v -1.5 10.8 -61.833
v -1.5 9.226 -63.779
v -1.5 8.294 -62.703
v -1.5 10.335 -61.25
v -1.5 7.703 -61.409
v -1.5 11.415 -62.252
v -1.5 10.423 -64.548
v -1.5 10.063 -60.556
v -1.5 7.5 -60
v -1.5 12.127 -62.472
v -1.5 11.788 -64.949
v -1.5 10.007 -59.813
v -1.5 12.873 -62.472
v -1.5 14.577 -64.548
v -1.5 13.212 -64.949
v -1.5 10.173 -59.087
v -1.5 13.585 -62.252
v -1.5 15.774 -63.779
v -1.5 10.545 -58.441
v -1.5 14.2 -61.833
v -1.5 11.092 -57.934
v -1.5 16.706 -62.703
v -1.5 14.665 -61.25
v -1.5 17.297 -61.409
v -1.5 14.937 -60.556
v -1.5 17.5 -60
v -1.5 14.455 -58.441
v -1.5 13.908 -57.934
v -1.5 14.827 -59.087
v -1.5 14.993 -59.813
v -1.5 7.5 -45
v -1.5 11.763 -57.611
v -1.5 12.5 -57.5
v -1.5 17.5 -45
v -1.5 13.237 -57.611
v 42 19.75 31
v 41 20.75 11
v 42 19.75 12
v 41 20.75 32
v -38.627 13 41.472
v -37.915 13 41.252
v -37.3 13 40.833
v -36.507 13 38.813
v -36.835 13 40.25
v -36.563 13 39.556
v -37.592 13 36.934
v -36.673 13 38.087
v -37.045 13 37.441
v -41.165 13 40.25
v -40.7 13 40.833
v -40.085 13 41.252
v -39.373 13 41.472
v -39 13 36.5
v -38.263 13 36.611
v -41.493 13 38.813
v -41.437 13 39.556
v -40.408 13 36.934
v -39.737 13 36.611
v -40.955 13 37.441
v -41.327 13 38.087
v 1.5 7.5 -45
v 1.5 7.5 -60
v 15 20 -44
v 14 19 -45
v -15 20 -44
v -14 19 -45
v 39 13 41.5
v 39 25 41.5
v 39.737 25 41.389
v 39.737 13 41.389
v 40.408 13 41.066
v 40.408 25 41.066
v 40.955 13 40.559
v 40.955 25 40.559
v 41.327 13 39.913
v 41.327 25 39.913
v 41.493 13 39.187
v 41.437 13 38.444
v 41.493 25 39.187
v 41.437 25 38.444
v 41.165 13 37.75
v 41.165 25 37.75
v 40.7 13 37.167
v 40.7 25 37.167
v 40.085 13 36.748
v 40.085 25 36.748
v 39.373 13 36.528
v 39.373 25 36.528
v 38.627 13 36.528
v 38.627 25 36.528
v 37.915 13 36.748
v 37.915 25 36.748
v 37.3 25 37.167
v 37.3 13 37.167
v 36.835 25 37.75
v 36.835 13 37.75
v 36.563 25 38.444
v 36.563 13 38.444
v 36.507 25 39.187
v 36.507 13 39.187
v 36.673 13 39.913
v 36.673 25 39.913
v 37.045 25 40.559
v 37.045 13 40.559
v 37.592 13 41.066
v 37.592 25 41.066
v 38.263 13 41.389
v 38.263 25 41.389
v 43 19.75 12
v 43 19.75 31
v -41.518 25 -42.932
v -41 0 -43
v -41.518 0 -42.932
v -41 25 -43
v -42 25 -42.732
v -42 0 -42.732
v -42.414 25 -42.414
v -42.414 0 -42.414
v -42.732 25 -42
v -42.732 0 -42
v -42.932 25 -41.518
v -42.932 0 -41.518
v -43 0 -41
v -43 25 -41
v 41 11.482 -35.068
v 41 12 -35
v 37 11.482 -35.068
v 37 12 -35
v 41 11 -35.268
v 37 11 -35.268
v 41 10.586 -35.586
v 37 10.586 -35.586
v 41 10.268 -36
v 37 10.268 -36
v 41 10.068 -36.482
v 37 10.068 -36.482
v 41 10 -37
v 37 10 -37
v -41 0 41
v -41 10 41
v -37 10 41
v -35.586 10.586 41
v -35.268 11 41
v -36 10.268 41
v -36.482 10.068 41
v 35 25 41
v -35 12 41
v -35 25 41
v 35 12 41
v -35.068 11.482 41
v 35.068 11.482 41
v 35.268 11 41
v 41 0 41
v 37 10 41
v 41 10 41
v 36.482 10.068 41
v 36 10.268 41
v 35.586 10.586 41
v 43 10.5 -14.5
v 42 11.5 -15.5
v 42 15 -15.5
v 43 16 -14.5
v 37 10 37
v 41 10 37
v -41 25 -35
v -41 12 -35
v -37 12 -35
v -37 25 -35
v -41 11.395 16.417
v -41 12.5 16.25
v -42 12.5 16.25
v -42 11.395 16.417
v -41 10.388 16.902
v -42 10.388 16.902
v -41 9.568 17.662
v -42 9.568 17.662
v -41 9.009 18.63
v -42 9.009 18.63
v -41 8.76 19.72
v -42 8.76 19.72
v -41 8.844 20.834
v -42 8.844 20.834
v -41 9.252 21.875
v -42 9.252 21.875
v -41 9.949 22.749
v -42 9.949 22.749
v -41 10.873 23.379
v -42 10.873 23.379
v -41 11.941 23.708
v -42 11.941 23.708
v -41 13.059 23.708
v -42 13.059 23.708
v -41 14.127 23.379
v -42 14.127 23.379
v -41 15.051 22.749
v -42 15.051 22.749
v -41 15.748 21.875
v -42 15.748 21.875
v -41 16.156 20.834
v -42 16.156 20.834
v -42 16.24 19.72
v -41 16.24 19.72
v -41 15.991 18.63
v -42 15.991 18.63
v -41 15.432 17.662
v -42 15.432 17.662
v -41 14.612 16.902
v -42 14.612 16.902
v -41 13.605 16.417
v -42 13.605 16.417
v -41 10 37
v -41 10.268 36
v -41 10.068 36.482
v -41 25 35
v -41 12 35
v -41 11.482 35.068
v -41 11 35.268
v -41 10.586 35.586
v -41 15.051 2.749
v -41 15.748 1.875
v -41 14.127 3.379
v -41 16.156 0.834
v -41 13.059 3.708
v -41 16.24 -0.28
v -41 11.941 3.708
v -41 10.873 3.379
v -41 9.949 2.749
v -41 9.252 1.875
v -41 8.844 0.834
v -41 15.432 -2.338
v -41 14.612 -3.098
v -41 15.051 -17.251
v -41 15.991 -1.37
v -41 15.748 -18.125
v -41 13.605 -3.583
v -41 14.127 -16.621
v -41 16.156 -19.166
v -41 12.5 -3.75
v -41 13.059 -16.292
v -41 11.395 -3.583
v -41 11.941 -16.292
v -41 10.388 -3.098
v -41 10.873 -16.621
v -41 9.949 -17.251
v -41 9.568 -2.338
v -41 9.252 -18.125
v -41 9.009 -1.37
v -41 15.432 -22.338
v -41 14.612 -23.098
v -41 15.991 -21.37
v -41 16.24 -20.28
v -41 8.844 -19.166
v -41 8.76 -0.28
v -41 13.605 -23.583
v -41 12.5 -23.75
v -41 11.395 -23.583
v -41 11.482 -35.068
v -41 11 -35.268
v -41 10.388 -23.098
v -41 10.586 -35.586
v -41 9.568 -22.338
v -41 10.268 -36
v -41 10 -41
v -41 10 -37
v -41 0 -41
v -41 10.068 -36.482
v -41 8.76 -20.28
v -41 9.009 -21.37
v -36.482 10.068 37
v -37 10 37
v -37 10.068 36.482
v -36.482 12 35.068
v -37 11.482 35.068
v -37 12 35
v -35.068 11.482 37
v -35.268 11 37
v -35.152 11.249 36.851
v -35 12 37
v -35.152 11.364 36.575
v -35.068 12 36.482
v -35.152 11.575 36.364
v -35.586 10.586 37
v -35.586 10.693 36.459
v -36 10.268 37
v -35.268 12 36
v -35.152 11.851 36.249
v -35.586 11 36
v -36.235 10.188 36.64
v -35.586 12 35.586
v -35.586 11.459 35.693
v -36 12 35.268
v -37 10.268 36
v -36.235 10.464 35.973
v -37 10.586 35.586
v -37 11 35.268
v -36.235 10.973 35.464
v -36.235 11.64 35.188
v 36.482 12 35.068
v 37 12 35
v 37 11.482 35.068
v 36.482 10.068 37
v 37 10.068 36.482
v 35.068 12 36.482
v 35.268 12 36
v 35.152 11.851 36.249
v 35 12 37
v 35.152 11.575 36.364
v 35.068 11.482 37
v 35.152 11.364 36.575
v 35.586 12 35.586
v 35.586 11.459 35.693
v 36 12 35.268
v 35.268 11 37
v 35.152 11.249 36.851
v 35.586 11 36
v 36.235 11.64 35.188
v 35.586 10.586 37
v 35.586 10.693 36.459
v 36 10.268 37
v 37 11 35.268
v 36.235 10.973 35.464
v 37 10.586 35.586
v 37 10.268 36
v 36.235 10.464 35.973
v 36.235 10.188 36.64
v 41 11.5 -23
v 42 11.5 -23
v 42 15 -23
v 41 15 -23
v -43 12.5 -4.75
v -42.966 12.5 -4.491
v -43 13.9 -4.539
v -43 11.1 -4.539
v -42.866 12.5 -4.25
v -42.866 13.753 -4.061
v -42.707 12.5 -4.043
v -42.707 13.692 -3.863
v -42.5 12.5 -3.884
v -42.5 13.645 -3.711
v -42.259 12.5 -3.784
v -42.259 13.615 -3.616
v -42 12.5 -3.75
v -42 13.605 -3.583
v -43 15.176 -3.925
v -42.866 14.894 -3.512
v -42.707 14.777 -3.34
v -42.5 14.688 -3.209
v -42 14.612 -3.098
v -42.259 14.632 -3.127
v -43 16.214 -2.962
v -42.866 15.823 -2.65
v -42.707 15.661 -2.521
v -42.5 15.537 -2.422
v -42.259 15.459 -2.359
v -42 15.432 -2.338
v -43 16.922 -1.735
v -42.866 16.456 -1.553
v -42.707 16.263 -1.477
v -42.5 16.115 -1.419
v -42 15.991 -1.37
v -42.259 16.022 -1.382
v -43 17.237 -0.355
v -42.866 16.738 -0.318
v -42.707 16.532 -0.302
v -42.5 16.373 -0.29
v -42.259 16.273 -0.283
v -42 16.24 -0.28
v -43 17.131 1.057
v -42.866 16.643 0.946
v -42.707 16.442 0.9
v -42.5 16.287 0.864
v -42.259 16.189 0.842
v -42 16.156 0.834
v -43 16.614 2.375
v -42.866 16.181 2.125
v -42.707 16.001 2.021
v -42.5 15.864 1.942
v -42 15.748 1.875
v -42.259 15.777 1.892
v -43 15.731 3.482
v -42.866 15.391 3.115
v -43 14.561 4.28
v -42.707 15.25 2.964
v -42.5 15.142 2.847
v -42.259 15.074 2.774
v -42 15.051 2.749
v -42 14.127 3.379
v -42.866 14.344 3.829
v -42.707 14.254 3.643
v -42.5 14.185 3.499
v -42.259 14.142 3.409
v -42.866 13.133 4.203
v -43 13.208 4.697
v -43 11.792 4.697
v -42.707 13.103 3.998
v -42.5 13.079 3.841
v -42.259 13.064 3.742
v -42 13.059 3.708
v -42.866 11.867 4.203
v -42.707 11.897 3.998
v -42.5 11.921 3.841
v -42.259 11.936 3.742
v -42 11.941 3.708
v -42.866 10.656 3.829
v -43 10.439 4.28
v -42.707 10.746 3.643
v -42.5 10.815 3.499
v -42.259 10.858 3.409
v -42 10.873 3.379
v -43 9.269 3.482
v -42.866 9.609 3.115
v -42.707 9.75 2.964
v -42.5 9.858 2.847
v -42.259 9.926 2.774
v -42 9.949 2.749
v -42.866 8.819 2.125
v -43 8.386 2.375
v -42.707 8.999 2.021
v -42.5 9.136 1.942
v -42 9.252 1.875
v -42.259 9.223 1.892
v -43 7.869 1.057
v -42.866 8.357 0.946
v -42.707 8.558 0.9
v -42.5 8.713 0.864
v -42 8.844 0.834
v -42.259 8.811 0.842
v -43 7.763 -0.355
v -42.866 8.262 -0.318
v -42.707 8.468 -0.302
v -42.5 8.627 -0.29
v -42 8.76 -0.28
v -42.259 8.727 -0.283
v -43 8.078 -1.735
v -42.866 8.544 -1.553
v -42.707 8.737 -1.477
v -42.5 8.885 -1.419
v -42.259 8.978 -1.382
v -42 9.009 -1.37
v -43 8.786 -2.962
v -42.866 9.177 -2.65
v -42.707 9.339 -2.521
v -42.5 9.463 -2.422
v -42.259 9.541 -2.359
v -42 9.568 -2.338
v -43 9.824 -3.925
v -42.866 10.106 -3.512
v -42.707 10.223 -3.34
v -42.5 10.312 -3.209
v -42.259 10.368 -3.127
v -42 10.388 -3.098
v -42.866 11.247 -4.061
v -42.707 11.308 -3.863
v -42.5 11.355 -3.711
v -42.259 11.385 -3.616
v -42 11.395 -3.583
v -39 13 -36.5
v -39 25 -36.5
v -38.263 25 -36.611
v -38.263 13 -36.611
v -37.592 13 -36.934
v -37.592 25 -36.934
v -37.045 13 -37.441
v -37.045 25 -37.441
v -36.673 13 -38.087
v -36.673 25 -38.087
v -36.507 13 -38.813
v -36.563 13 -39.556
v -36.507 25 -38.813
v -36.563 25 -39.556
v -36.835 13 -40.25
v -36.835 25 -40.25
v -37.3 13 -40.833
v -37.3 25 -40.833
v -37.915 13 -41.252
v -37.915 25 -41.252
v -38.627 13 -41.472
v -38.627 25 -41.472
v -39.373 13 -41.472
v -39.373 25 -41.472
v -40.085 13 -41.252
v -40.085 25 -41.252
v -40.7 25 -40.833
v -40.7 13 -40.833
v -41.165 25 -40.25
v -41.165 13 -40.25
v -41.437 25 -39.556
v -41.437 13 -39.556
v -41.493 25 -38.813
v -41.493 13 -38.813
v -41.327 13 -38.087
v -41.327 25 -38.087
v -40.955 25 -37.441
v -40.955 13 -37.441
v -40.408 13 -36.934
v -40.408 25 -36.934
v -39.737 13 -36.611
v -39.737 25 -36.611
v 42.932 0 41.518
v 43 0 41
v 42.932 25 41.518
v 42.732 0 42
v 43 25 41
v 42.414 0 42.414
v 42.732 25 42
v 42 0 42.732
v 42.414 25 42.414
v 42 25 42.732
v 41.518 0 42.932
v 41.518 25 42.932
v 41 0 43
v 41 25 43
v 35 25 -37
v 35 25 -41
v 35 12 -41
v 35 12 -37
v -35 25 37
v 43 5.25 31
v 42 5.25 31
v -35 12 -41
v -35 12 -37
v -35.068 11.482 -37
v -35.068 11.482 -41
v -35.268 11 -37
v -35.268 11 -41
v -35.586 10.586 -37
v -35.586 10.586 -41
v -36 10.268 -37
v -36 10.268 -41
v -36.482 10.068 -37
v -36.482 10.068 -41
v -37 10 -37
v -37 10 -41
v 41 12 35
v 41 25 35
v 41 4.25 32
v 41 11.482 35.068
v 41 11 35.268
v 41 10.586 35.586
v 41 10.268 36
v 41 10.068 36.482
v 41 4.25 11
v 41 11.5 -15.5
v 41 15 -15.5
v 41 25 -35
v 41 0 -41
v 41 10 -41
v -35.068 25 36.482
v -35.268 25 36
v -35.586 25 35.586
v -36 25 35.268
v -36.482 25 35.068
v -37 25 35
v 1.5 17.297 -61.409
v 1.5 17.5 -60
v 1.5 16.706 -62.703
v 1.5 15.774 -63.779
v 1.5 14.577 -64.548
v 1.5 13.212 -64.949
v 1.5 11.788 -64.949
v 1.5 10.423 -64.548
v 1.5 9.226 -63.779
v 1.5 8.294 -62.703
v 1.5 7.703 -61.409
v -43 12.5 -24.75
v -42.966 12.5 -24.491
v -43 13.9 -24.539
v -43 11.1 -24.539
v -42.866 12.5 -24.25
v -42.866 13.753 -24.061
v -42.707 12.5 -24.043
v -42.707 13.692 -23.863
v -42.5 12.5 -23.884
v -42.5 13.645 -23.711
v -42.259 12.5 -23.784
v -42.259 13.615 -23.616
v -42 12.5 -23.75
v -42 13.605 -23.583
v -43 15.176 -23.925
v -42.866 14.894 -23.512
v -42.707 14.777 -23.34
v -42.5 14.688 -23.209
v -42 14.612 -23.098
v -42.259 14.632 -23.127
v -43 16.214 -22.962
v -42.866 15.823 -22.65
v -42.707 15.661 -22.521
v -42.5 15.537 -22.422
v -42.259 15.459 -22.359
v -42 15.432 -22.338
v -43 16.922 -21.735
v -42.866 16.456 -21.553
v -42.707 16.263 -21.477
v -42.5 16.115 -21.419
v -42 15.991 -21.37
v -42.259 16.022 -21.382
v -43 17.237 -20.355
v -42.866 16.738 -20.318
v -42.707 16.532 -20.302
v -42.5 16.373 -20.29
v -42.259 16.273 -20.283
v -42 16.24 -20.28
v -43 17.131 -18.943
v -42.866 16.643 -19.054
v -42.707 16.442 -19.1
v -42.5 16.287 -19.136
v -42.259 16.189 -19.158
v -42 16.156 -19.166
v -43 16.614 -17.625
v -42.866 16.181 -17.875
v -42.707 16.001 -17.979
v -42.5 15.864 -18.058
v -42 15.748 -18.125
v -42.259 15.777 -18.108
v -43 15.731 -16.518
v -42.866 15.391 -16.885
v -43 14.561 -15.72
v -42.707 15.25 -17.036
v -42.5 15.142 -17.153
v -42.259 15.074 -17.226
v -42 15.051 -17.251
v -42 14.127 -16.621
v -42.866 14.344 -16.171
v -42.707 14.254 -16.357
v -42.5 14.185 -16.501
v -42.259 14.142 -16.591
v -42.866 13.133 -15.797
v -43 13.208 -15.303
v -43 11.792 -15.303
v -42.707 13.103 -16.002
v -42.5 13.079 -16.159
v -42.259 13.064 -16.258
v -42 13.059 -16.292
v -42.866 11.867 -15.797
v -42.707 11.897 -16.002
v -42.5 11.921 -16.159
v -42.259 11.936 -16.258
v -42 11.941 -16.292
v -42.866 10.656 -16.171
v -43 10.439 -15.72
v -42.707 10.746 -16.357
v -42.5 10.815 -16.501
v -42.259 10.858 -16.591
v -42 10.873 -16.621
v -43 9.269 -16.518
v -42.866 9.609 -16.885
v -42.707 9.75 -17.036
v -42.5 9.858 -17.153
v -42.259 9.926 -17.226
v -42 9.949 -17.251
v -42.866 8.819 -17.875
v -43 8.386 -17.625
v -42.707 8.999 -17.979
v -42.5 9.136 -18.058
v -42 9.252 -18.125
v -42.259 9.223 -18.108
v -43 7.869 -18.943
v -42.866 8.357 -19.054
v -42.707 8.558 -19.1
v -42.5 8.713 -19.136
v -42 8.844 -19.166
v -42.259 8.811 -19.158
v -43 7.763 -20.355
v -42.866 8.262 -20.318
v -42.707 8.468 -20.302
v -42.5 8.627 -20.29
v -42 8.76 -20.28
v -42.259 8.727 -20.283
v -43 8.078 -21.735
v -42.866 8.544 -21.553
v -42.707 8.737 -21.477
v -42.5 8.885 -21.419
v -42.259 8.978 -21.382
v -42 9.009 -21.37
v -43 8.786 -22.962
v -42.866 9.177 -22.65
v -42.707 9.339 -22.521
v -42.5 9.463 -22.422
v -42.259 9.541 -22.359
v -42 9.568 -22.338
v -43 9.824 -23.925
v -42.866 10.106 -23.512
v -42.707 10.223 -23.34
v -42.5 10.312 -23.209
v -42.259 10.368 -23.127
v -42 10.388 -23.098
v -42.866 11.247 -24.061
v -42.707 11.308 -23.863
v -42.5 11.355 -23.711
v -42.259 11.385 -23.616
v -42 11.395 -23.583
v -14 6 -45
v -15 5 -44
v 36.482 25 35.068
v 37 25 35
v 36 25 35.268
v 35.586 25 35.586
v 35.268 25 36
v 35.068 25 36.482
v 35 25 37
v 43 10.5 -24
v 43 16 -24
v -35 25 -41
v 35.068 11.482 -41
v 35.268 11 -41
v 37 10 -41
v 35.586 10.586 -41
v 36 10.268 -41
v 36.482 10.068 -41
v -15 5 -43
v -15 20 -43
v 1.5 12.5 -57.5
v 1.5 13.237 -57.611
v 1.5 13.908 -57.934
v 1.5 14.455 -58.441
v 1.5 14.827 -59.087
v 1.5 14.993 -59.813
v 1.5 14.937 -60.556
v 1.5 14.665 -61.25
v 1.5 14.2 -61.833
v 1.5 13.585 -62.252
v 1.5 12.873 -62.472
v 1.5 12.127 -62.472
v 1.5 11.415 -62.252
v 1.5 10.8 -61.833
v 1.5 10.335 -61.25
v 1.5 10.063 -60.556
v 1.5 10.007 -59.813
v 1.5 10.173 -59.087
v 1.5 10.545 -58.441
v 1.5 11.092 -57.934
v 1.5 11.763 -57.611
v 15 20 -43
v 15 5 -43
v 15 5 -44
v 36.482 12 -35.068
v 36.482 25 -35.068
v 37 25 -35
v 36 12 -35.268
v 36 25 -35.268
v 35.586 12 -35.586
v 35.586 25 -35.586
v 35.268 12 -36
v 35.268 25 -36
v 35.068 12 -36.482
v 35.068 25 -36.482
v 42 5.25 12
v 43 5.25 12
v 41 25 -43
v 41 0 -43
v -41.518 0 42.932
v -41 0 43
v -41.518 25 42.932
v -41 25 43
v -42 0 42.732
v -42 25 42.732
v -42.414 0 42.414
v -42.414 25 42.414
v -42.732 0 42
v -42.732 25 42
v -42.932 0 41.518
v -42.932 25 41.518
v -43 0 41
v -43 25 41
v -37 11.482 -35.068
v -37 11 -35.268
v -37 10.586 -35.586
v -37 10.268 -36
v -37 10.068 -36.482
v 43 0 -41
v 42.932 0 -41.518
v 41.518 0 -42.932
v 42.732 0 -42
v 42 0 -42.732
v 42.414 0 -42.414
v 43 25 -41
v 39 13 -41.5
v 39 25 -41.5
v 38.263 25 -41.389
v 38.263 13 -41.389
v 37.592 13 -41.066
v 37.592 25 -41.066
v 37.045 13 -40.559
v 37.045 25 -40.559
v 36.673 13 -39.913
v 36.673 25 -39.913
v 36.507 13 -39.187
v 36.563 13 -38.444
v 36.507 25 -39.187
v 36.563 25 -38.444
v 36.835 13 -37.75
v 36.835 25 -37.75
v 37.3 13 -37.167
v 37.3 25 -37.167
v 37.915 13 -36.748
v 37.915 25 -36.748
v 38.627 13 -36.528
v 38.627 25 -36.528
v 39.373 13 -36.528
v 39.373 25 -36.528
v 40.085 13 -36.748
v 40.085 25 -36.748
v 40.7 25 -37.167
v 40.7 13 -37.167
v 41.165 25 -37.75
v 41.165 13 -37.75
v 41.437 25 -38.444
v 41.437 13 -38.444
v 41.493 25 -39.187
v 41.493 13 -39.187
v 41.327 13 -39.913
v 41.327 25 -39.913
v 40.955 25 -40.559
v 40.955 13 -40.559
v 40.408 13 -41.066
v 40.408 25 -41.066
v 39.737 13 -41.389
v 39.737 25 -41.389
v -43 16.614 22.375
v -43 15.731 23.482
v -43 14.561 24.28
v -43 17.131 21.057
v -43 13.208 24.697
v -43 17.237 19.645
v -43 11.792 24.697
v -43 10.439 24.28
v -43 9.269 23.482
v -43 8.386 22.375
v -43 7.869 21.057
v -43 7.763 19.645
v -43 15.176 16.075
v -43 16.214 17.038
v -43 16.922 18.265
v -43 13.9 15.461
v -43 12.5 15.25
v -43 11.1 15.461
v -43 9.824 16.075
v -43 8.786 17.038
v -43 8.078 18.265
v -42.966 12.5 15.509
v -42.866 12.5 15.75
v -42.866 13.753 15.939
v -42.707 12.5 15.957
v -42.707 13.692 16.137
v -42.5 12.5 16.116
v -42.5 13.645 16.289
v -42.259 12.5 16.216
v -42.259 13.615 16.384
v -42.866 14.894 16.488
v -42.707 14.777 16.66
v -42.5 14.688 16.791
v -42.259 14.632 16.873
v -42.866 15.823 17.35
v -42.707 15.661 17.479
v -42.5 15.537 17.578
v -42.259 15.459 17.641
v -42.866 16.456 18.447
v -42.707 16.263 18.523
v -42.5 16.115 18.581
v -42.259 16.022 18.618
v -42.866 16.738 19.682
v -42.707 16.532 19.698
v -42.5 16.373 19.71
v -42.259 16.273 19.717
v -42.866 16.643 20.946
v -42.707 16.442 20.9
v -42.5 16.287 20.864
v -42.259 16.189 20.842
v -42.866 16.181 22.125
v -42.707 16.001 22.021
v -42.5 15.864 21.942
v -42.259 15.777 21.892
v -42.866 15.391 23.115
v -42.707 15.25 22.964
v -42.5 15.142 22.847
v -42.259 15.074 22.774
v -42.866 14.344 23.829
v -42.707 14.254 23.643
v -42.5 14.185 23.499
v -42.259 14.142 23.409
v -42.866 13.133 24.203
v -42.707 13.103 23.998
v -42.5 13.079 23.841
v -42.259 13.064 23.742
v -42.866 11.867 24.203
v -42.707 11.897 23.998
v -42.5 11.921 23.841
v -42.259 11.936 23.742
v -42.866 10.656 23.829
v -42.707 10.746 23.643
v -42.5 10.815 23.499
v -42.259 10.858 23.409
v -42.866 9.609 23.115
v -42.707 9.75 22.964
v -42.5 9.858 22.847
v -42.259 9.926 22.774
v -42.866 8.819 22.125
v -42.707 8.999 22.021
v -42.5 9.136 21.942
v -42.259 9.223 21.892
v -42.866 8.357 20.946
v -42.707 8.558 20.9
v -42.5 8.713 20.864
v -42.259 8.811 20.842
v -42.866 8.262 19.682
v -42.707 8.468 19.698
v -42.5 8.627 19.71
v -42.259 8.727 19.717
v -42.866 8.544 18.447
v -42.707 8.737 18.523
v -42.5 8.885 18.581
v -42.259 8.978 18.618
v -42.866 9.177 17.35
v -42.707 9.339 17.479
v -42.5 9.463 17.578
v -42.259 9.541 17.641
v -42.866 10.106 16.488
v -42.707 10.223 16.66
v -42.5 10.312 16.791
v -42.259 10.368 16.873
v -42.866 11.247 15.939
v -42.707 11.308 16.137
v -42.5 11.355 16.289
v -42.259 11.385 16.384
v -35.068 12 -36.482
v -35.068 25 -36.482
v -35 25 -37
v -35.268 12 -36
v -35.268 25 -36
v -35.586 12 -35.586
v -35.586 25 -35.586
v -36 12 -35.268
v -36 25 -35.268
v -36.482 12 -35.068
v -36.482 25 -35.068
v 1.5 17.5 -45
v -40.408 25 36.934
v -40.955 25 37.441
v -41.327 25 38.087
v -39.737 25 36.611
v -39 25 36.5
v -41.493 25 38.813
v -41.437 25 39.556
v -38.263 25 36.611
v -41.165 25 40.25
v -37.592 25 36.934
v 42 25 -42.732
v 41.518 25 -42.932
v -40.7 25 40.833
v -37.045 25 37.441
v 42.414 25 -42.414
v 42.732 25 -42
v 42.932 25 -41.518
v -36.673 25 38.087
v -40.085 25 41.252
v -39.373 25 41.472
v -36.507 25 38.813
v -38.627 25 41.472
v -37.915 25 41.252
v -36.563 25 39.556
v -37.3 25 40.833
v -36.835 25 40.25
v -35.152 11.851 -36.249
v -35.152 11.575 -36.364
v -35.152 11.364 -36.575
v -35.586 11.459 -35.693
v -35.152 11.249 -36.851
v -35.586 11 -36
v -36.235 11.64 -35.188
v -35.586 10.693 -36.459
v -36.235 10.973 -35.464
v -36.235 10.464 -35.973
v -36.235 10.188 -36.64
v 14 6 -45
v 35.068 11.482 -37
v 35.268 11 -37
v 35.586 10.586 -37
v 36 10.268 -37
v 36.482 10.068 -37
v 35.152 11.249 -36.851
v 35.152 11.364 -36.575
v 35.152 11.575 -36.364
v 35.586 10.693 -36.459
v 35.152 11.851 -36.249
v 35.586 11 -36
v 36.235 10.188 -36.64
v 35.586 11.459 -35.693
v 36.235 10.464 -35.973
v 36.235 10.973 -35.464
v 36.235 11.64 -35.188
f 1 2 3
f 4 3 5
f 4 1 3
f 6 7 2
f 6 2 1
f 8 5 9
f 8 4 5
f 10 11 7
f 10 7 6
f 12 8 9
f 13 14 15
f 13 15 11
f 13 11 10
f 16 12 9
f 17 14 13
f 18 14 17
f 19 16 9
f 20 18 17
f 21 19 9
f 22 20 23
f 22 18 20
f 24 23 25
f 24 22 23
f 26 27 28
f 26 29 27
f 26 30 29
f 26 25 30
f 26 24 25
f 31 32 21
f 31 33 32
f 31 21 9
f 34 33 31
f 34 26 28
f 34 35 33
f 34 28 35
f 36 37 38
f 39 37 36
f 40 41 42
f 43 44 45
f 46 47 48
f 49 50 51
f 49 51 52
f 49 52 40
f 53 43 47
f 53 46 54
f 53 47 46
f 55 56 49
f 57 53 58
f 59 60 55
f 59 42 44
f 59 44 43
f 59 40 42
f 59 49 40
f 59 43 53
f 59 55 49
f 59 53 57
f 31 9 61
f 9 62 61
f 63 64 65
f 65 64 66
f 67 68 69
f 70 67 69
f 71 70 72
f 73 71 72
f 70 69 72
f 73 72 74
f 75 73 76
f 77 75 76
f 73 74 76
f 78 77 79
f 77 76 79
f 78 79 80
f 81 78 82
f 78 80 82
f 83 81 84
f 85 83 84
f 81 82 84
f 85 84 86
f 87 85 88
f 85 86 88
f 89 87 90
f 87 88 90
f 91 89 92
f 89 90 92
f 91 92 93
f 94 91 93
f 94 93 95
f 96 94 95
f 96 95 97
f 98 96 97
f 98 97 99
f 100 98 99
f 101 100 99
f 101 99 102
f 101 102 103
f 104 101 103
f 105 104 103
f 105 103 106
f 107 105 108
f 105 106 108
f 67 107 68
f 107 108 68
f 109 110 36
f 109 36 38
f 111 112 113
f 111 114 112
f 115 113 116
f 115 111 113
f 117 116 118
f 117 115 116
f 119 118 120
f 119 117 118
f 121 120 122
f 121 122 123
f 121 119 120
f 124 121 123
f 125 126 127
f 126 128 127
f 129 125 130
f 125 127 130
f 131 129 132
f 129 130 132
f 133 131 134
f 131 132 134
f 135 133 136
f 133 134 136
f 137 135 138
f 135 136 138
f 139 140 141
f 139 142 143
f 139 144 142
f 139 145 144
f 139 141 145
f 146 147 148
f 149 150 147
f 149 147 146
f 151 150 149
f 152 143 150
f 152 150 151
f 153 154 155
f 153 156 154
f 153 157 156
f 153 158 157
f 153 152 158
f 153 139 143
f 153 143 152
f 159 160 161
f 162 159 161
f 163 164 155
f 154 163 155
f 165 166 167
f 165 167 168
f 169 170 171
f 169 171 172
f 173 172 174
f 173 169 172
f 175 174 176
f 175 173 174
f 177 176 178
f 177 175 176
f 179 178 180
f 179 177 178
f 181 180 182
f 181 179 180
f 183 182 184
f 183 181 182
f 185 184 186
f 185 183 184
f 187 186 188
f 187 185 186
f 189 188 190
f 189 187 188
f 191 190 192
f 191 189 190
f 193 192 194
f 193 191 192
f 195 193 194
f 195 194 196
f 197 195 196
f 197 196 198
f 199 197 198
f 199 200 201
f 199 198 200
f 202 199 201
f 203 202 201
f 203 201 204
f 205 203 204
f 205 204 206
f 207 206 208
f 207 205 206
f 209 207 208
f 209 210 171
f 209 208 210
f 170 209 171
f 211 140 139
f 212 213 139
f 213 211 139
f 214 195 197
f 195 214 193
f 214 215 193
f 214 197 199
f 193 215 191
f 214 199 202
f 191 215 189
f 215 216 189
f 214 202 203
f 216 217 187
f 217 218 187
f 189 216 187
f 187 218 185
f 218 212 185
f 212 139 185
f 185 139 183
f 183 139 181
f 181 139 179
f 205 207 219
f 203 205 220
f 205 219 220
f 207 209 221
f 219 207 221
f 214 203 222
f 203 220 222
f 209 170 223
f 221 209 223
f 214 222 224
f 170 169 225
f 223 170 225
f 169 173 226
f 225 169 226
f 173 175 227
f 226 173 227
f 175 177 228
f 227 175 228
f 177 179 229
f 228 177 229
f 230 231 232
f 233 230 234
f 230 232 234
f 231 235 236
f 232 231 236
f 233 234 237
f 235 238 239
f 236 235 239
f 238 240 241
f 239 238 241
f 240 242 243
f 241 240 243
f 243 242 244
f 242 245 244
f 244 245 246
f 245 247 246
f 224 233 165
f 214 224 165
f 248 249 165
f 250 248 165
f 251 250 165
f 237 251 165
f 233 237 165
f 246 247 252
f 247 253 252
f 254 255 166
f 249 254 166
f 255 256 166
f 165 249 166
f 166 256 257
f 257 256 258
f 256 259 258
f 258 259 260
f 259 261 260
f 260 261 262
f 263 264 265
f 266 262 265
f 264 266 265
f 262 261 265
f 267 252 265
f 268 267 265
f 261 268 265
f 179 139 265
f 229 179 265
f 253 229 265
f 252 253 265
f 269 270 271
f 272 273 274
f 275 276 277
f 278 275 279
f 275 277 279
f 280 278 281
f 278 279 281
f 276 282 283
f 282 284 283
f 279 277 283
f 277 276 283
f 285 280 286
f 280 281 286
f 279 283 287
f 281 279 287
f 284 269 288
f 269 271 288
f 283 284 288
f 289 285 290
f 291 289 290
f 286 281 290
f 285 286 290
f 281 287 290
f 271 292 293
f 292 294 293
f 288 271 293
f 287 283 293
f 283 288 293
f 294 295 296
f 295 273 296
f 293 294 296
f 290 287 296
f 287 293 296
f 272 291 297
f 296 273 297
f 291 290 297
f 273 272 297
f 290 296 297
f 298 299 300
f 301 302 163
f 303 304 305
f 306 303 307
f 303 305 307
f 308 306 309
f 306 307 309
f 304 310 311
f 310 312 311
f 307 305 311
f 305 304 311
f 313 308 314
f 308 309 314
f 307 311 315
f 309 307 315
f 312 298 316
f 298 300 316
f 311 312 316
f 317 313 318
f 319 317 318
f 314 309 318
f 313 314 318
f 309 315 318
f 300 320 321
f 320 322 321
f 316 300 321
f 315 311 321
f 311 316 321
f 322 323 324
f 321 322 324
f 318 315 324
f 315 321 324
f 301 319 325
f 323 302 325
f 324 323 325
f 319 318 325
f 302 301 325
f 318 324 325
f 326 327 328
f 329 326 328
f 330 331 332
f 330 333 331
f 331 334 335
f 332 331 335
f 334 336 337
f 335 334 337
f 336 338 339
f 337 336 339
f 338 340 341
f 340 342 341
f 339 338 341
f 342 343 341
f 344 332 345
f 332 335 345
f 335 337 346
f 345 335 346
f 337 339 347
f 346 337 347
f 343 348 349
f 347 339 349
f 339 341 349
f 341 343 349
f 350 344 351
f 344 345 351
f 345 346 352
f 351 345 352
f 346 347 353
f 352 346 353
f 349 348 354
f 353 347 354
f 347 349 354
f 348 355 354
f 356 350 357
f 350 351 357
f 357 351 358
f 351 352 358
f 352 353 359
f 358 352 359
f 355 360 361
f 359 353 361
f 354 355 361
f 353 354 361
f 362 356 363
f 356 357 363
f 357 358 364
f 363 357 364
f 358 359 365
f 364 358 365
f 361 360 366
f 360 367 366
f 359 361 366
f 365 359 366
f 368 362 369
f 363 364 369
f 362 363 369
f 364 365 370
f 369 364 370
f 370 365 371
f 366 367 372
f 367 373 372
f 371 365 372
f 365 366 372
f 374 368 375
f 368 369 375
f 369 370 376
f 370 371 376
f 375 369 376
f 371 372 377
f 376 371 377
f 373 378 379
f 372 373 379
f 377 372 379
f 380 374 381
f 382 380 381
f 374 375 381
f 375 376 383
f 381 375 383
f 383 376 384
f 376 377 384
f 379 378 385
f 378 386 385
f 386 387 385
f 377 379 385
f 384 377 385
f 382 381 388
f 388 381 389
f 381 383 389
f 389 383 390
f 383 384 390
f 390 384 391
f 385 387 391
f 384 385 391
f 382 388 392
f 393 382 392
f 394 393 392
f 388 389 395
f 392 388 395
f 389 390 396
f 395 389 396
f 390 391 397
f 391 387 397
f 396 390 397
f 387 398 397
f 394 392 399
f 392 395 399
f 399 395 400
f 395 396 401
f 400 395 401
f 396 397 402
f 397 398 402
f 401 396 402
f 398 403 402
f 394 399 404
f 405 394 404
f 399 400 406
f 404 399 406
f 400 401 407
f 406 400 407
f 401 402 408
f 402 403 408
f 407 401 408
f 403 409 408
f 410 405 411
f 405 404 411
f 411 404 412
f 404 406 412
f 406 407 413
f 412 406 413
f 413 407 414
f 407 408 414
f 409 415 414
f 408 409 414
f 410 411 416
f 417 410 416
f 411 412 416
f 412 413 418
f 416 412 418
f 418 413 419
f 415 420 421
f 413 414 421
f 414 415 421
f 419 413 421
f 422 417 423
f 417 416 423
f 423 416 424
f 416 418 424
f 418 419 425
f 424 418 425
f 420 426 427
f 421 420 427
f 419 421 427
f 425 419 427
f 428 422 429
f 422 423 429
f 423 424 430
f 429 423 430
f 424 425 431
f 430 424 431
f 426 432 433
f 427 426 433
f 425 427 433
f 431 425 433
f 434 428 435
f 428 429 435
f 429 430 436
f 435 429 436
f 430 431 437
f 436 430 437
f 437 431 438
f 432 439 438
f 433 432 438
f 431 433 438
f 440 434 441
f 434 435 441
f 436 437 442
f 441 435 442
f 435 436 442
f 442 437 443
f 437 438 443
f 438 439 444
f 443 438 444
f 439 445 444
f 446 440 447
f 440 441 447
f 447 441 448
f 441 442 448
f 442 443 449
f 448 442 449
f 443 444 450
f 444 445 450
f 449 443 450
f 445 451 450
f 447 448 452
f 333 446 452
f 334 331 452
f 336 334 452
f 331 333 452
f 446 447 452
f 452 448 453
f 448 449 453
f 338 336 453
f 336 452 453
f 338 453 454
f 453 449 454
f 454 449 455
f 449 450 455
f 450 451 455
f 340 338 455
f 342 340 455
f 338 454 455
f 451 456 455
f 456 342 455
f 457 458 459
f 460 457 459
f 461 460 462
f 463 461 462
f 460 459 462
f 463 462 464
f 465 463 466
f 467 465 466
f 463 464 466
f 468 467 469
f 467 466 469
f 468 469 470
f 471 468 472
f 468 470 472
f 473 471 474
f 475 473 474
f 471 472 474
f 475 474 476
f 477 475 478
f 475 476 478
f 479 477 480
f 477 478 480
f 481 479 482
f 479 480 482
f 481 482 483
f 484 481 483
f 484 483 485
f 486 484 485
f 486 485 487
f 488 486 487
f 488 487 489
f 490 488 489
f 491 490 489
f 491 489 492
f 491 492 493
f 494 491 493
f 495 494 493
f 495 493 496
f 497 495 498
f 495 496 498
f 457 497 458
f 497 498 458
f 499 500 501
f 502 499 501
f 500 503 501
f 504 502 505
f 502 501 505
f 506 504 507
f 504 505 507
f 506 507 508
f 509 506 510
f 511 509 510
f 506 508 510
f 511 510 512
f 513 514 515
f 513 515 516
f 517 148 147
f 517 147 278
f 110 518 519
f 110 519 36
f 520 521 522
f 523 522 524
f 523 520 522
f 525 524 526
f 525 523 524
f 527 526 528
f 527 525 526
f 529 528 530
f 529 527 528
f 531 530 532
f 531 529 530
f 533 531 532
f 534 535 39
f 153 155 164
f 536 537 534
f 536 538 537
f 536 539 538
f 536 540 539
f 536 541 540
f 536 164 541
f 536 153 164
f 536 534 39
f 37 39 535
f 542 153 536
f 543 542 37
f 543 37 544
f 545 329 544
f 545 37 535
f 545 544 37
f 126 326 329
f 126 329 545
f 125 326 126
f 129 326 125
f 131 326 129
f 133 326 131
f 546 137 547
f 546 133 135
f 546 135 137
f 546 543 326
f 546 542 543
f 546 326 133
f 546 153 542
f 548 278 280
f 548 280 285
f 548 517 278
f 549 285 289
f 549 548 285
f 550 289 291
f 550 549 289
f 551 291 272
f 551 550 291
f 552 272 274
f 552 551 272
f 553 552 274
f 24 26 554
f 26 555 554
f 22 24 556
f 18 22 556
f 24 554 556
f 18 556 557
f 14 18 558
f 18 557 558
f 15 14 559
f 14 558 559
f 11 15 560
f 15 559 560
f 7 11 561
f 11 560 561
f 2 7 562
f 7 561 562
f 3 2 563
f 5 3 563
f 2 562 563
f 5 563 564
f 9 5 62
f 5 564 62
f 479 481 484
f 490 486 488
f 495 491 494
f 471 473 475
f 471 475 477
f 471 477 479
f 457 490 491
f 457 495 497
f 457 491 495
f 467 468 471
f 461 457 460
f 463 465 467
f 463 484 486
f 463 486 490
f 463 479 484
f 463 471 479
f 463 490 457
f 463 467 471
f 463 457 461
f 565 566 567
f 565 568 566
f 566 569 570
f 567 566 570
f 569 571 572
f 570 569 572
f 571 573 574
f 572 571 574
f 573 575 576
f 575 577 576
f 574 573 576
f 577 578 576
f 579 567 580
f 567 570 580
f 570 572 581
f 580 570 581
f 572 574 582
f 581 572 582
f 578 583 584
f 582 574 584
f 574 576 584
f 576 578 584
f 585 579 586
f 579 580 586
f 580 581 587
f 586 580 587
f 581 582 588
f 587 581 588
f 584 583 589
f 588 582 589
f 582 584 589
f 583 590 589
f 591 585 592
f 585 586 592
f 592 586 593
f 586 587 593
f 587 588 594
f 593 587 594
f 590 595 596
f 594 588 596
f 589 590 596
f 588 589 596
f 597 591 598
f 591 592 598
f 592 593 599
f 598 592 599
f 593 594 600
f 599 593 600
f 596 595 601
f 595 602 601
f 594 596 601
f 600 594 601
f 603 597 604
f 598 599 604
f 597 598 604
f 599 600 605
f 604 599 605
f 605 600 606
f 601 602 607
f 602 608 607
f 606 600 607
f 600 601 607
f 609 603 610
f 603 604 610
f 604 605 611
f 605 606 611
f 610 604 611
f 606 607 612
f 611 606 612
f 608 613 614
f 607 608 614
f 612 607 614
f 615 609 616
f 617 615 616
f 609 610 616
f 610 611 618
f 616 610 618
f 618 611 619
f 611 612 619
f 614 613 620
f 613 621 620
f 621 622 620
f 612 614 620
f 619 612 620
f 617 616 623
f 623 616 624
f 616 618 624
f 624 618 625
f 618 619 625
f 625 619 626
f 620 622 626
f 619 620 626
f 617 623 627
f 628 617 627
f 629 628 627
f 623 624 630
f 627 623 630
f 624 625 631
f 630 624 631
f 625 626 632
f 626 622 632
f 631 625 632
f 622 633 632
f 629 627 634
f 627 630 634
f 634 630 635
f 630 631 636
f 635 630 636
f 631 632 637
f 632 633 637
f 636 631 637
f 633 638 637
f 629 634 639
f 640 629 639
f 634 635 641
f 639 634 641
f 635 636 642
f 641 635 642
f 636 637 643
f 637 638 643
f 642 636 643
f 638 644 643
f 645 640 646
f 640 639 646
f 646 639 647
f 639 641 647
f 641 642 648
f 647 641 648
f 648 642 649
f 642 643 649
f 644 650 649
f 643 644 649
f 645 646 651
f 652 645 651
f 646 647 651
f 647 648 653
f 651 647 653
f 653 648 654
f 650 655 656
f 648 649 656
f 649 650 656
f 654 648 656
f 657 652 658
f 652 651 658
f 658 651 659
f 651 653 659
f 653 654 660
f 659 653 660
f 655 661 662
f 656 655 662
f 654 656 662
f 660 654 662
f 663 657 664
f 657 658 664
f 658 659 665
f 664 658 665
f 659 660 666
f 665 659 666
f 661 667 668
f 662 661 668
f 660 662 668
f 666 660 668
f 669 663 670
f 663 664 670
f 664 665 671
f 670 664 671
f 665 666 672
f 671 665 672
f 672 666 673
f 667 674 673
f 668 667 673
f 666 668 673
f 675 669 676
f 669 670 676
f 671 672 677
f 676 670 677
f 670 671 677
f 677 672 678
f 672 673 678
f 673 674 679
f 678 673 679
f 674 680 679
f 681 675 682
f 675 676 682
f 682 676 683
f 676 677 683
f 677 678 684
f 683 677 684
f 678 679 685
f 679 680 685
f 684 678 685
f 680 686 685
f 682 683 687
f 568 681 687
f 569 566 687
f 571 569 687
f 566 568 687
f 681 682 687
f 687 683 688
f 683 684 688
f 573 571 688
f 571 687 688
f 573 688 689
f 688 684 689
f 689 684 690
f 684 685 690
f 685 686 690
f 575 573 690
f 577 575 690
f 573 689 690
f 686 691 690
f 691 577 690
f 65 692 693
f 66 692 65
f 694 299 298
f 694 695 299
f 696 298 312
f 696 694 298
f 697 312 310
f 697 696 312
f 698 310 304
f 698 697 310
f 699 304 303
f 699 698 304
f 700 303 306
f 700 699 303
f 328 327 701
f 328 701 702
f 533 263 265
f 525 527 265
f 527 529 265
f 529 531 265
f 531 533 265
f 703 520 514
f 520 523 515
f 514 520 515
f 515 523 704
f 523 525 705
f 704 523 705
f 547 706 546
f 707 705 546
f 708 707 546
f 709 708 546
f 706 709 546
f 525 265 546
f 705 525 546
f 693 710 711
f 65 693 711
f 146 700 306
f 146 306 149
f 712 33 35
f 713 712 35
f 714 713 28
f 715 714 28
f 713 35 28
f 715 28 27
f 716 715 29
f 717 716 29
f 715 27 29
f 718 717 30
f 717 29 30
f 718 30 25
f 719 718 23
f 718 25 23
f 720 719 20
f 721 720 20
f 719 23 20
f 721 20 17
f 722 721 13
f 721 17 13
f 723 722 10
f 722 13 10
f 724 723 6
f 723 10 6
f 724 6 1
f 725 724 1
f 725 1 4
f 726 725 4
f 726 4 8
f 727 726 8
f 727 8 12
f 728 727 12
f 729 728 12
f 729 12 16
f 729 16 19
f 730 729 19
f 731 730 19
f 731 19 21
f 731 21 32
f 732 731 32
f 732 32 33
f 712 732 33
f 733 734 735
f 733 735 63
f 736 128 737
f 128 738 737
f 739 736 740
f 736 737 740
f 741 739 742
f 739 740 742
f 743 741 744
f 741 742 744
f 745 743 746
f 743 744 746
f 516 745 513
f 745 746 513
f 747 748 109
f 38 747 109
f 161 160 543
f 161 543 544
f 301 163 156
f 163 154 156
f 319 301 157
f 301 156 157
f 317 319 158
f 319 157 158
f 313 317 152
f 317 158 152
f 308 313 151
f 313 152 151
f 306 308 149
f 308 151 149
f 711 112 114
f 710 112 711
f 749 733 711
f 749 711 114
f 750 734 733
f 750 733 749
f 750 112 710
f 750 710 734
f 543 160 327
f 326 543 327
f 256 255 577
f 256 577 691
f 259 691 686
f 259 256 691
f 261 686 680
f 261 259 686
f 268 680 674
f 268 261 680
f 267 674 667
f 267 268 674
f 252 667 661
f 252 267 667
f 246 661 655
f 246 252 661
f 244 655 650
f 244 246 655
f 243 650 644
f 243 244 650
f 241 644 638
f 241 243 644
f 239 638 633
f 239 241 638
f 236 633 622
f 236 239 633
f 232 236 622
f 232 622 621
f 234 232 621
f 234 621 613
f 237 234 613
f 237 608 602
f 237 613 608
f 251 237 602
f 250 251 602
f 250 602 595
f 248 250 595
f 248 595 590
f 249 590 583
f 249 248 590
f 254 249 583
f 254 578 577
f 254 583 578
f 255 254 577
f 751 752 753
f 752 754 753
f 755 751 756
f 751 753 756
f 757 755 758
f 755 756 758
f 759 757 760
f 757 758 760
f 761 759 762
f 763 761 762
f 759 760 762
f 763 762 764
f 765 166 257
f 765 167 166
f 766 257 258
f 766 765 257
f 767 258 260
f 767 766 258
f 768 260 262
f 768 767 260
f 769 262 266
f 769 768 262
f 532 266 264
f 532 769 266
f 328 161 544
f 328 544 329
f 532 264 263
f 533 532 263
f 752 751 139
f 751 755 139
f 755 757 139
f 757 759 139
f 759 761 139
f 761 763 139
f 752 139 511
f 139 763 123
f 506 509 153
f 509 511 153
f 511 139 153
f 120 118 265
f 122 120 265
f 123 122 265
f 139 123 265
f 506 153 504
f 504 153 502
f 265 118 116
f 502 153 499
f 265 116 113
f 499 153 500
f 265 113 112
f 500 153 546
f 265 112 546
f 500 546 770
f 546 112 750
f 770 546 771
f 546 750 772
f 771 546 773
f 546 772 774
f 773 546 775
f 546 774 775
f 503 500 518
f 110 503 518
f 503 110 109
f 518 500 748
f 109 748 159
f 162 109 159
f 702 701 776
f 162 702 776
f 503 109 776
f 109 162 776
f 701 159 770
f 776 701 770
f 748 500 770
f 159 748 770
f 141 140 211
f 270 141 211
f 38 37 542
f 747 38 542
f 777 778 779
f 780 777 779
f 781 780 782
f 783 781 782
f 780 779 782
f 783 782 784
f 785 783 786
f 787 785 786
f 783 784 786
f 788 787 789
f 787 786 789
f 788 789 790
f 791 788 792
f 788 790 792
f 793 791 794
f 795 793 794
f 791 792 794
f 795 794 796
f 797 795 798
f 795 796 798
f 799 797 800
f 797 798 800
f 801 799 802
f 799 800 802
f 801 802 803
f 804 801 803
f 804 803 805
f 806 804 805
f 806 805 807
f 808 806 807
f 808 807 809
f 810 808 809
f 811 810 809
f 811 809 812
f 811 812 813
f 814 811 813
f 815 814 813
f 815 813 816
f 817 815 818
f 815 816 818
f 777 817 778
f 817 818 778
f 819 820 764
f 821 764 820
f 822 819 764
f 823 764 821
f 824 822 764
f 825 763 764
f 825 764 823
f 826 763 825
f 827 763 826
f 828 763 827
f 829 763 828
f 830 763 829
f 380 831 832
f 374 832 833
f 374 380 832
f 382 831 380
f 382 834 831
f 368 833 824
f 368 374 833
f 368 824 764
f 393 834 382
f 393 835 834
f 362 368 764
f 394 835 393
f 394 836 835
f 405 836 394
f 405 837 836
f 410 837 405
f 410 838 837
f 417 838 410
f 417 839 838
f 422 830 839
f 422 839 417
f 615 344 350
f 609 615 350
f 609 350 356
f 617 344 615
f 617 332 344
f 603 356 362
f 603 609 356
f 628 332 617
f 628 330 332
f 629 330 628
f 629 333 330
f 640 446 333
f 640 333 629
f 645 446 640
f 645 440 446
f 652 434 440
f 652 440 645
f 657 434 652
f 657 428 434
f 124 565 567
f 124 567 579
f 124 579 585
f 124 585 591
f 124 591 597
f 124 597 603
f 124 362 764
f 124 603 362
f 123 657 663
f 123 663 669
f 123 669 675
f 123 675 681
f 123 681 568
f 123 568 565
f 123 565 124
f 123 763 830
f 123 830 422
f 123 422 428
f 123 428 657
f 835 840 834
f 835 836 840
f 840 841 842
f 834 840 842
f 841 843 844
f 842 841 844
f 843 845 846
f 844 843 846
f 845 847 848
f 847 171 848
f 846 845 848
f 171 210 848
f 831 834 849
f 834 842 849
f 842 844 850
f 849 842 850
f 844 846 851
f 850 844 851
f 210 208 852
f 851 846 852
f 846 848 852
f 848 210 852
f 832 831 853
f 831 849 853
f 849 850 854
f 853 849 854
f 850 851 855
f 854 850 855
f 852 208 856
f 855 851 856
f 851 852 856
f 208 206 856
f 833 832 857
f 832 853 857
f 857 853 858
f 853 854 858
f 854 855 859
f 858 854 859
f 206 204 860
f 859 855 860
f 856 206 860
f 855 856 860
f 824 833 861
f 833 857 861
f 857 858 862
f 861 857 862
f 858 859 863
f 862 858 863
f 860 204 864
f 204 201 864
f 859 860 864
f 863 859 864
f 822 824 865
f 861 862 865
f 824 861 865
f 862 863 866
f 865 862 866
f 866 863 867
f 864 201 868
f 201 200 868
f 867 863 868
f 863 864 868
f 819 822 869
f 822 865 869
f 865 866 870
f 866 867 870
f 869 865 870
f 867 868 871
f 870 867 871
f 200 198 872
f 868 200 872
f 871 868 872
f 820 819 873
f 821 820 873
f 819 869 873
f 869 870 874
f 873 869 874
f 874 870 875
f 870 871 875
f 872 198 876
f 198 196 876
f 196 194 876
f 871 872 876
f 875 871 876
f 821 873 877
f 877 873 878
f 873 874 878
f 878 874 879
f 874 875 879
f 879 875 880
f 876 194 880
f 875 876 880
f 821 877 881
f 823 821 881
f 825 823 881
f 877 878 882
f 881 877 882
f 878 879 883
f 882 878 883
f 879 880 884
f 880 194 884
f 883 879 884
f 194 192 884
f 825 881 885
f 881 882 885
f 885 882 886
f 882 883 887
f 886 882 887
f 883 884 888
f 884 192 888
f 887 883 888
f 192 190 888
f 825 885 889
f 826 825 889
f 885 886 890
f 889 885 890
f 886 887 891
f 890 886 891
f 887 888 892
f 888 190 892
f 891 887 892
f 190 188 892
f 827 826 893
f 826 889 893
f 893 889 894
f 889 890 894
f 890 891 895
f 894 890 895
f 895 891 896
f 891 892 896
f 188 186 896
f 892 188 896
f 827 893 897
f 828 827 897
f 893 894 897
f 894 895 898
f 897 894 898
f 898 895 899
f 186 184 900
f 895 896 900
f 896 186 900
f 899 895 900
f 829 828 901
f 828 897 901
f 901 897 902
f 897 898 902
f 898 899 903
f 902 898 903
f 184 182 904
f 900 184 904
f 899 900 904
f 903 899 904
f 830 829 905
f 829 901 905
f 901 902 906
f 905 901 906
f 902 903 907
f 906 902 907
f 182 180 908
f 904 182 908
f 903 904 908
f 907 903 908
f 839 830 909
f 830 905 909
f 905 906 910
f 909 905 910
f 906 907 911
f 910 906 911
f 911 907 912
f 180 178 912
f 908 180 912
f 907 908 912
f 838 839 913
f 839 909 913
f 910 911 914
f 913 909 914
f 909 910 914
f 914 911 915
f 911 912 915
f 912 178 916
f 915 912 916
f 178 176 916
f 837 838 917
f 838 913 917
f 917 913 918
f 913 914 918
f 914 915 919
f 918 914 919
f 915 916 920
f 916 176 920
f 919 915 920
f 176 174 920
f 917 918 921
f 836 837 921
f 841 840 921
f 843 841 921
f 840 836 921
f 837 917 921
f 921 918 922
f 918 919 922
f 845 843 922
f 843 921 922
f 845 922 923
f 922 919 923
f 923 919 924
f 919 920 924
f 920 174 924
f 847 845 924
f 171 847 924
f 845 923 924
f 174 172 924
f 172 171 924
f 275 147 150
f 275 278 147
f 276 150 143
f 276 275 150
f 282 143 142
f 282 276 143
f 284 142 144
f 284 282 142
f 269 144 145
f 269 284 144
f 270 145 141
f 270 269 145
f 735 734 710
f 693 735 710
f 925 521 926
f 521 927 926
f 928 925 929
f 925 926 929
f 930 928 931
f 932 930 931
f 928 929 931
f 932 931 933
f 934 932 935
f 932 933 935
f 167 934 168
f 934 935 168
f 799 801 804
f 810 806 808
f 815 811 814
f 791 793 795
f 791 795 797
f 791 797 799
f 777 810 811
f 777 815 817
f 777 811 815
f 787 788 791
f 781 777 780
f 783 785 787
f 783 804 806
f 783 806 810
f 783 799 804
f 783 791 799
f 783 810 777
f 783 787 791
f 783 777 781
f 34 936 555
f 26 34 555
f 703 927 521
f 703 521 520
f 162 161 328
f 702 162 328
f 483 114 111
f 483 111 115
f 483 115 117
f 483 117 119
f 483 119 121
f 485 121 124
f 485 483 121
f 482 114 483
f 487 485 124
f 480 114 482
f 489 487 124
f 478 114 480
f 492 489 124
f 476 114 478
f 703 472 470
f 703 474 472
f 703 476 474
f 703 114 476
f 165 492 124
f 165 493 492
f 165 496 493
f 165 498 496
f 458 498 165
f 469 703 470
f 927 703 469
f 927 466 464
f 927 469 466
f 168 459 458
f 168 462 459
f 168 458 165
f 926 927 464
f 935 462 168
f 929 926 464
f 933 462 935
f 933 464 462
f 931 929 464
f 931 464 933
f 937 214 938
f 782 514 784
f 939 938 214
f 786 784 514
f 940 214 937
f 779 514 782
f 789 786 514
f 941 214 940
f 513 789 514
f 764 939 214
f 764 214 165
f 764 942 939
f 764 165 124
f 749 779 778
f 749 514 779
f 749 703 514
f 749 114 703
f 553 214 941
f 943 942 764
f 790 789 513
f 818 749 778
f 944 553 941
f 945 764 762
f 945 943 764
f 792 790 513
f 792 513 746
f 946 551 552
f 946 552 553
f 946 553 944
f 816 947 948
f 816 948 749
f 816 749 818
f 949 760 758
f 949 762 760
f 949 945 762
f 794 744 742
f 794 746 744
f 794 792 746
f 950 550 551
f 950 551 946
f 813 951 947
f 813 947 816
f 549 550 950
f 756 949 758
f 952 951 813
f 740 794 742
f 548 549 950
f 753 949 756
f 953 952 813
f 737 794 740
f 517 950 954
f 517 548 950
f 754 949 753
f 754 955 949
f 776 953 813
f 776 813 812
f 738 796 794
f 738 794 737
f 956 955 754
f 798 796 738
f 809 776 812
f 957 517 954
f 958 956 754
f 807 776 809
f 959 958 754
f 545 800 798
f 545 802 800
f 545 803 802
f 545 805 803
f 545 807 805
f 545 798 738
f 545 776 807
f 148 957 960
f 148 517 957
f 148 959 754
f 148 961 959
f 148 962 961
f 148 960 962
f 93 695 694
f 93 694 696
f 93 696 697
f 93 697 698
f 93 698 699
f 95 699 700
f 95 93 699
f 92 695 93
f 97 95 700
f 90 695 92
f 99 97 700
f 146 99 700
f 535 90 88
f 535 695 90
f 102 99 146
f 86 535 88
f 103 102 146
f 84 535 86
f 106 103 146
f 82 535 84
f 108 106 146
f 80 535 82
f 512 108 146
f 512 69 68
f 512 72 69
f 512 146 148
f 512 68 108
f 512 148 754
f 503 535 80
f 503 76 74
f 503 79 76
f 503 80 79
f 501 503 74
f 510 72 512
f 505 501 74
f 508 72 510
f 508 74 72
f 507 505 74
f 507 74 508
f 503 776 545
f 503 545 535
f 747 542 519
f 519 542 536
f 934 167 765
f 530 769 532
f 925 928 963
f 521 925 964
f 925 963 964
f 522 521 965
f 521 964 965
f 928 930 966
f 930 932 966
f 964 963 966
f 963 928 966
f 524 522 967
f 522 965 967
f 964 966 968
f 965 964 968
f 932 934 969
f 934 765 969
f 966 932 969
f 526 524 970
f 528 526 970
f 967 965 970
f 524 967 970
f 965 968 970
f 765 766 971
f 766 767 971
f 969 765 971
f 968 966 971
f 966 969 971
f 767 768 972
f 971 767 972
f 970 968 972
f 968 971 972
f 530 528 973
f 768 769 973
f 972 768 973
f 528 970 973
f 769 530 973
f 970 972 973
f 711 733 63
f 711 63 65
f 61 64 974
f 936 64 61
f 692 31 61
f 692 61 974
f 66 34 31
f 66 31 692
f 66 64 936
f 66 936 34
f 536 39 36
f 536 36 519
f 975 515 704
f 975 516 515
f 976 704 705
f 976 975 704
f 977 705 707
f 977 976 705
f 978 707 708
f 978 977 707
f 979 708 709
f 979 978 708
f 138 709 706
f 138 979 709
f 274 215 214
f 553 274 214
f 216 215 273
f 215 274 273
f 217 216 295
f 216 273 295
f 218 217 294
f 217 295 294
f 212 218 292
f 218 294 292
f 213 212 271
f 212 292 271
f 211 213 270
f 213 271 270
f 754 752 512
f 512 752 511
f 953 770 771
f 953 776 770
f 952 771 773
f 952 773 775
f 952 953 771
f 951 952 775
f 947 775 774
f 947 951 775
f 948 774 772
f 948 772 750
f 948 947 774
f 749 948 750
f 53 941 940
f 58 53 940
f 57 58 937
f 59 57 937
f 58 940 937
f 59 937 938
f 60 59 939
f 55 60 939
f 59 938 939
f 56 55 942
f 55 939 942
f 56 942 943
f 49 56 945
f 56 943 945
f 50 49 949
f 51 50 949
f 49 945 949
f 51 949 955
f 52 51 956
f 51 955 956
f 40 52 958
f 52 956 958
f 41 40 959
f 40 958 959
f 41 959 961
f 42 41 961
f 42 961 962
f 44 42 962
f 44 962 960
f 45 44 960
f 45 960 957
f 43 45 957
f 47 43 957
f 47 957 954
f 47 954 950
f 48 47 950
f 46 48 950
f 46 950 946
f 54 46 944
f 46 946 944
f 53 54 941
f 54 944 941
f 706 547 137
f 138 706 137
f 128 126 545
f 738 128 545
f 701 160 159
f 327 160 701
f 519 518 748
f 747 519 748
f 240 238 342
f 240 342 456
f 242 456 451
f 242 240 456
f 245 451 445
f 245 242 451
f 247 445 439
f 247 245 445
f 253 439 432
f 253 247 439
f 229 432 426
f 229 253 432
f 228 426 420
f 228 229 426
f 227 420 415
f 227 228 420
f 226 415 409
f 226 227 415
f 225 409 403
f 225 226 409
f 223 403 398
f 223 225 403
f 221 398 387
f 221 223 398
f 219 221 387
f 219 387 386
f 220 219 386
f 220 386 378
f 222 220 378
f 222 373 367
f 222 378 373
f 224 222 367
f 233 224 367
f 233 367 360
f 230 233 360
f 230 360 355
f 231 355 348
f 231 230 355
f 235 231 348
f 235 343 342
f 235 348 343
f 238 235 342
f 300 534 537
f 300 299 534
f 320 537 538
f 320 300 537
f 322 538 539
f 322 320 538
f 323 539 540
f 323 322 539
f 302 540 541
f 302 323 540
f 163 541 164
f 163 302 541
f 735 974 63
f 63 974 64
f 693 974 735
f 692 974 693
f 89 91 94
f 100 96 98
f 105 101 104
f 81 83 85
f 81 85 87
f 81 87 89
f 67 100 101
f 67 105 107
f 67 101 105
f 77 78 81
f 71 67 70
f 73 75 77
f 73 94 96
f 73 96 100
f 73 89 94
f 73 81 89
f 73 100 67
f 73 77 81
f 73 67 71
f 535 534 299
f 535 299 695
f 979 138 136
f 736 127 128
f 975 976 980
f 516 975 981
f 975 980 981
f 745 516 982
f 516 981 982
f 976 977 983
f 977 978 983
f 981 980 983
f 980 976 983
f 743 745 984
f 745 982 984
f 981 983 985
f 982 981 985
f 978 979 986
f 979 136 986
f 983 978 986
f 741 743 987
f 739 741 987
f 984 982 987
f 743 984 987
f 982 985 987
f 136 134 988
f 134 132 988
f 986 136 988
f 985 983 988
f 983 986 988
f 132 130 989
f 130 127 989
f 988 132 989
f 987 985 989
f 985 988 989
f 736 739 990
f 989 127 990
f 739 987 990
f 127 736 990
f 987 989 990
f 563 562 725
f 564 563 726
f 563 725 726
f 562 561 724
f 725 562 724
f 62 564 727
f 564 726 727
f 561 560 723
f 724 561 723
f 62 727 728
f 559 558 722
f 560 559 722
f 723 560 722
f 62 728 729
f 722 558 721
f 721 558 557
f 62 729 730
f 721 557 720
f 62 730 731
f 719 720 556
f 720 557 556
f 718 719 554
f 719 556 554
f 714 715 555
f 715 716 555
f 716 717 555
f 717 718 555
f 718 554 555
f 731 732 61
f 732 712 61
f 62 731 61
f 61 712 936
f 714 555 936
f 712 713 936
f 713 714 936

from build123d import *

# Parameters (mm, degrees)
SKETCH_1_W               = 86
SKETCH_1_H               = 86
SKETCH_1_W_2             = 82
SKETCH_1_H_2             = 82
EXTRUDE_1_DEPTH          = 25
CUT_EXTRUDE_1_DEPTH      = 100.347873656
CUT_EXTRUDE_1_DEPTH_BACK = 28
SKETCH_2_R               = 3.75
FILLET_1_R               = 1
SKETCH_4_W               = 7.5
SKETCH_4_H               = 3.5
SKETCH_4_W_2             = 19
SKETCH_4_H_2             = 14.5
CUT_EXTRUDE_2_DEPTH      = 28
CHAMFER_1_SIZE           = 1
CHAMFER_2_SIZE           = 1
FILLET_2_R               = 2
SKETCH_9_W               = 6
SKETCH_9_H               = 15
EXTRUDE_2_DEPTH          = 6
SKETCH_13_W              = 6
SKETCH_13_H              = 15
EXTRUDE_3_DEPTH          = 6
SKETCH_14_W              = 6
SKETCH_14_H              = 15
EXTRUDE_4_DEPTH          = 6
SKETCH_15_R              = 2.5
CUT_EXTRUDE_5_DEPTH      = 12
FILLET_3_R               = 2
SKETCH_16_W              = 30
SKETCH_16_H              = 15
EXTRUDE_5_DEPTH          = 2
CHAMFER_3_SIZE           = 1
EXTRUDE_6_DEPTH          = 1.5
SKETCH_20_R              = 2.5
CUT_EXTRUDE_6_DEPTH      = 83.645326547


with BuildPart() as part:
    # 草图1 → 凸台-拉伸1 (new body)
    with BuildSketch(Plane(origin=(0, 0, 0), x_dir=(1, 0, 0), z_dir=(0, 1, 0))):
        Rectangle(SKETCH_1_W, SKETCH_1_H)
        Rectangle(SKETCH_1_W_2, SKETCH_1_H_2, mode=Mode.SUBTRACT)
    extrude(amount=EXTRUDE_1_DEPTH)

    # 草图2 → 切除-拉伸1 (cut, two sides: drawn at the far end of the back side and taken through both)
    with BuildSketch(Plane.ZY.offset(43).offset(-CUT_EXTRUDE_1_DEPTH_BACK)):
        with Locations((0, 12.5)):
            Circle(SKETCH_2_R)
        with Locations((20, 12.5)):
            Circle(SKETCH_2_R)
        with Locations((-20, 12.5)):
            Circle(SKETCH_2_R)
    extrude(amount=CUT_EXTRUDE_1_DEPTH + CUT_EXTRUDE_1_DEPTH_BACK, mode=Mode.SUBTRACT)

    # 圆角1
    fillet_1_edges = [part.edges().sort_by_distance(p)[0] for p in [
        (-43, 12.5, 16.25),
        (-43, 12.5, -3.75),
        (-43, 12.5, -23.75),
    ]]
    fillet(fillet_1_edges, radius=FILLET_1_R)

    # 草图4 → 切除-拉伸2 (cut)
    with BuildSketch(Plane(origin=(43, 0, 0), x_dir=(0, 0, -1), z_dir=(1, 0, 0))):
        with Locations((19.25, 13.25)):
            Rectangle(SKETCH_4_W, SKETCH_4_H)
        with Locations((-21.5, 12.5)):
            Rectangle(SKETCH_4_W_2, SKETCH_4_H_2)
    extrude(amount=-CUT_EXTRUDE_2_DEPTH, mode=Mode.SUBTRACT)

    # 倒角1
    chamfer_1_edges = [part.edges().sort_by_distance(p)[0] for p in [
        (43, 11.5, -19.25),
        (43, 13.25, -23),
        (43, 15, -19.25),
        (43, 13.25, -15.5),
    ]]
    chamfer(chamfer_1_edges, length=CHAMFER_1_SIZE)

    # 倒角2
    chamfer_2_edges = [part.edges().sort_by_distance(p)[0] for p in [
        (41, 12.5, 12),
        (41, 19.75, 21.5),
        (41, 12.5, 31),
        (41, 5.25, 21.5),
    ]]
    chamfer(chamfer_2_edges, length=CHAMFER_2_SIZE)

    # 圆角2
    fillet_2_edges = [part.edges().sort_by_distance(p)[0] for p in [
        (-43, 12.5, 43),
        (-43, 12.5, -43),
        (43, 12.5, -43),
        (43, 12.5, 43),
    ]]
    fillet(fillet_2_edges, radius=FILLET_2_R)

    # 草图9 → 凸台-拉伸2 (add)
    with BuildSketch(Plane(origin=(-41, 0, 0), x_dir=(0, 0, -1), z_dir=(1, 0, 0))):
        with Locations((-38, 17.5)):
            Rectangle(SKETCH_9_W, SKETCH_9_H)
    extrude(amount=EXTRUDE_2_DEPTH)

    # 草图13 → 凸台-拉伸3 (add)
    with BuildSketch(Plane(origin=(-41, 0, 0), x_dir=(0, 0, -1), z_dir=(1, 0, 0))):
        with Locations((38, 17.5)):
            Rectangle(SKETCH_13_W, SKETCH_13_H)
    extrude(amount=EXTRUDE_3_DEPTH)

    # 草图14 → 凸台-拉伸4 (add)
    with BuildSketch(Plane.ZY.offset(-41)):
        with Locations((38, 17.5)):
            Rectangle(SKETCH_14_W, SKETCH_14_H)
        with Locations((-38, 17.5)):
            Rectangle(SKETCH_14_W, SKETCH_14_H)
    extrude(amount=EXTRUDE_4_DEPTH)

    # 草图15 → 切除-拉伸5 (cut)
    with BuildSketch(Plane(origin=(0, 25, 0), x_dir=(1, 0, 0), z_dir=(0, 1, 0))):
        with Locations((-39, 39)):
            Circle(SKETCH_15_R)
        with Locations((39, 39)):
            Circle(SKETCH_15_R)
        with Locations((39, -39)):
            Circle(SKETCH_15_R)
        with Locations((-39, -39)):
            Circle(SKETCH_15_R)
    extrude(amount=-CUT_EXTRUDE_5_DEPTH, mode=Mode.SUBTRACT)

    # 圆角3
    fillet_3_edges = [part.edges().sort_by_distance(p)[0] for p in [
        (38, 10, -35),
        (35, 10, -38),
        (35, 17.5, -35),
        (38, 10, 35),
        (35, 10, 38),
        (35, 17.5, 35),
        (-35, 17.5, -35),
        (-35, 17.5, 35),
        (-38, 10, 35),
        (-35, 10, 38),
        (-38, 10, -35),
        (-35, 10, -38),
    ]]
    fillet(fillet_3_edges, radius=FILLET_3_R)

    # 草图16 → 凸台-拉伸5 (add)
    with BuildSketch(Plane(origin=(0, 0, -43), x_dir=(-1, 0, 0), z_dir=(0, 0, -1))):
        with Locations((0, 12.5)):
            Rectangle(SKETCH_16_W, SKETCH_16_H)
    extrude(amount=EXTRUDE_5_DEPTH)

    # 倒角3
    chamfer_3_edges = [part.edges().sort_by_distance(p)[0] for p in [
        (0, 5, -45),
        (15, 12.5, -45),
        (-15, 12.5, -45),
        (0, 20, -45),
    ]]
    chamfer(chamfer_3_edges, length=CHAMFER_3_SIZE)

    # 草图19 → 凸台-拉伸6 (add, symmetric)
    with BuildSketch(Plane(origin=(0, 0, 0), x_dir=(0, 0, -1), z_dir=(1, 0, 0))):
        with BuildLine():
            Line((45, 17.5), (60, 17.5))
            ThreePointArc((60, 17.5), (65, 12.5), (60, 7.5))
            Line((60, 7.5), (45, 7.5))
            Line((45, 7.5), (45, 17.5))
        make_face()
    extrude(amount=EXTRUDE_6_DEPTH, both=True)

    # 草图20 → 切除-拉伸6 (cut, through all)
    with BuildSketch(Plane.ZY.offset(1.5)):
        with Locations((-60, 12.5)):
            Circle(SKETCH_20_R)
    extrude(amount=-CUT_EXTRUDE_6_DEPTH, mode=Mode.SUBTRACT)


solid = part.part
